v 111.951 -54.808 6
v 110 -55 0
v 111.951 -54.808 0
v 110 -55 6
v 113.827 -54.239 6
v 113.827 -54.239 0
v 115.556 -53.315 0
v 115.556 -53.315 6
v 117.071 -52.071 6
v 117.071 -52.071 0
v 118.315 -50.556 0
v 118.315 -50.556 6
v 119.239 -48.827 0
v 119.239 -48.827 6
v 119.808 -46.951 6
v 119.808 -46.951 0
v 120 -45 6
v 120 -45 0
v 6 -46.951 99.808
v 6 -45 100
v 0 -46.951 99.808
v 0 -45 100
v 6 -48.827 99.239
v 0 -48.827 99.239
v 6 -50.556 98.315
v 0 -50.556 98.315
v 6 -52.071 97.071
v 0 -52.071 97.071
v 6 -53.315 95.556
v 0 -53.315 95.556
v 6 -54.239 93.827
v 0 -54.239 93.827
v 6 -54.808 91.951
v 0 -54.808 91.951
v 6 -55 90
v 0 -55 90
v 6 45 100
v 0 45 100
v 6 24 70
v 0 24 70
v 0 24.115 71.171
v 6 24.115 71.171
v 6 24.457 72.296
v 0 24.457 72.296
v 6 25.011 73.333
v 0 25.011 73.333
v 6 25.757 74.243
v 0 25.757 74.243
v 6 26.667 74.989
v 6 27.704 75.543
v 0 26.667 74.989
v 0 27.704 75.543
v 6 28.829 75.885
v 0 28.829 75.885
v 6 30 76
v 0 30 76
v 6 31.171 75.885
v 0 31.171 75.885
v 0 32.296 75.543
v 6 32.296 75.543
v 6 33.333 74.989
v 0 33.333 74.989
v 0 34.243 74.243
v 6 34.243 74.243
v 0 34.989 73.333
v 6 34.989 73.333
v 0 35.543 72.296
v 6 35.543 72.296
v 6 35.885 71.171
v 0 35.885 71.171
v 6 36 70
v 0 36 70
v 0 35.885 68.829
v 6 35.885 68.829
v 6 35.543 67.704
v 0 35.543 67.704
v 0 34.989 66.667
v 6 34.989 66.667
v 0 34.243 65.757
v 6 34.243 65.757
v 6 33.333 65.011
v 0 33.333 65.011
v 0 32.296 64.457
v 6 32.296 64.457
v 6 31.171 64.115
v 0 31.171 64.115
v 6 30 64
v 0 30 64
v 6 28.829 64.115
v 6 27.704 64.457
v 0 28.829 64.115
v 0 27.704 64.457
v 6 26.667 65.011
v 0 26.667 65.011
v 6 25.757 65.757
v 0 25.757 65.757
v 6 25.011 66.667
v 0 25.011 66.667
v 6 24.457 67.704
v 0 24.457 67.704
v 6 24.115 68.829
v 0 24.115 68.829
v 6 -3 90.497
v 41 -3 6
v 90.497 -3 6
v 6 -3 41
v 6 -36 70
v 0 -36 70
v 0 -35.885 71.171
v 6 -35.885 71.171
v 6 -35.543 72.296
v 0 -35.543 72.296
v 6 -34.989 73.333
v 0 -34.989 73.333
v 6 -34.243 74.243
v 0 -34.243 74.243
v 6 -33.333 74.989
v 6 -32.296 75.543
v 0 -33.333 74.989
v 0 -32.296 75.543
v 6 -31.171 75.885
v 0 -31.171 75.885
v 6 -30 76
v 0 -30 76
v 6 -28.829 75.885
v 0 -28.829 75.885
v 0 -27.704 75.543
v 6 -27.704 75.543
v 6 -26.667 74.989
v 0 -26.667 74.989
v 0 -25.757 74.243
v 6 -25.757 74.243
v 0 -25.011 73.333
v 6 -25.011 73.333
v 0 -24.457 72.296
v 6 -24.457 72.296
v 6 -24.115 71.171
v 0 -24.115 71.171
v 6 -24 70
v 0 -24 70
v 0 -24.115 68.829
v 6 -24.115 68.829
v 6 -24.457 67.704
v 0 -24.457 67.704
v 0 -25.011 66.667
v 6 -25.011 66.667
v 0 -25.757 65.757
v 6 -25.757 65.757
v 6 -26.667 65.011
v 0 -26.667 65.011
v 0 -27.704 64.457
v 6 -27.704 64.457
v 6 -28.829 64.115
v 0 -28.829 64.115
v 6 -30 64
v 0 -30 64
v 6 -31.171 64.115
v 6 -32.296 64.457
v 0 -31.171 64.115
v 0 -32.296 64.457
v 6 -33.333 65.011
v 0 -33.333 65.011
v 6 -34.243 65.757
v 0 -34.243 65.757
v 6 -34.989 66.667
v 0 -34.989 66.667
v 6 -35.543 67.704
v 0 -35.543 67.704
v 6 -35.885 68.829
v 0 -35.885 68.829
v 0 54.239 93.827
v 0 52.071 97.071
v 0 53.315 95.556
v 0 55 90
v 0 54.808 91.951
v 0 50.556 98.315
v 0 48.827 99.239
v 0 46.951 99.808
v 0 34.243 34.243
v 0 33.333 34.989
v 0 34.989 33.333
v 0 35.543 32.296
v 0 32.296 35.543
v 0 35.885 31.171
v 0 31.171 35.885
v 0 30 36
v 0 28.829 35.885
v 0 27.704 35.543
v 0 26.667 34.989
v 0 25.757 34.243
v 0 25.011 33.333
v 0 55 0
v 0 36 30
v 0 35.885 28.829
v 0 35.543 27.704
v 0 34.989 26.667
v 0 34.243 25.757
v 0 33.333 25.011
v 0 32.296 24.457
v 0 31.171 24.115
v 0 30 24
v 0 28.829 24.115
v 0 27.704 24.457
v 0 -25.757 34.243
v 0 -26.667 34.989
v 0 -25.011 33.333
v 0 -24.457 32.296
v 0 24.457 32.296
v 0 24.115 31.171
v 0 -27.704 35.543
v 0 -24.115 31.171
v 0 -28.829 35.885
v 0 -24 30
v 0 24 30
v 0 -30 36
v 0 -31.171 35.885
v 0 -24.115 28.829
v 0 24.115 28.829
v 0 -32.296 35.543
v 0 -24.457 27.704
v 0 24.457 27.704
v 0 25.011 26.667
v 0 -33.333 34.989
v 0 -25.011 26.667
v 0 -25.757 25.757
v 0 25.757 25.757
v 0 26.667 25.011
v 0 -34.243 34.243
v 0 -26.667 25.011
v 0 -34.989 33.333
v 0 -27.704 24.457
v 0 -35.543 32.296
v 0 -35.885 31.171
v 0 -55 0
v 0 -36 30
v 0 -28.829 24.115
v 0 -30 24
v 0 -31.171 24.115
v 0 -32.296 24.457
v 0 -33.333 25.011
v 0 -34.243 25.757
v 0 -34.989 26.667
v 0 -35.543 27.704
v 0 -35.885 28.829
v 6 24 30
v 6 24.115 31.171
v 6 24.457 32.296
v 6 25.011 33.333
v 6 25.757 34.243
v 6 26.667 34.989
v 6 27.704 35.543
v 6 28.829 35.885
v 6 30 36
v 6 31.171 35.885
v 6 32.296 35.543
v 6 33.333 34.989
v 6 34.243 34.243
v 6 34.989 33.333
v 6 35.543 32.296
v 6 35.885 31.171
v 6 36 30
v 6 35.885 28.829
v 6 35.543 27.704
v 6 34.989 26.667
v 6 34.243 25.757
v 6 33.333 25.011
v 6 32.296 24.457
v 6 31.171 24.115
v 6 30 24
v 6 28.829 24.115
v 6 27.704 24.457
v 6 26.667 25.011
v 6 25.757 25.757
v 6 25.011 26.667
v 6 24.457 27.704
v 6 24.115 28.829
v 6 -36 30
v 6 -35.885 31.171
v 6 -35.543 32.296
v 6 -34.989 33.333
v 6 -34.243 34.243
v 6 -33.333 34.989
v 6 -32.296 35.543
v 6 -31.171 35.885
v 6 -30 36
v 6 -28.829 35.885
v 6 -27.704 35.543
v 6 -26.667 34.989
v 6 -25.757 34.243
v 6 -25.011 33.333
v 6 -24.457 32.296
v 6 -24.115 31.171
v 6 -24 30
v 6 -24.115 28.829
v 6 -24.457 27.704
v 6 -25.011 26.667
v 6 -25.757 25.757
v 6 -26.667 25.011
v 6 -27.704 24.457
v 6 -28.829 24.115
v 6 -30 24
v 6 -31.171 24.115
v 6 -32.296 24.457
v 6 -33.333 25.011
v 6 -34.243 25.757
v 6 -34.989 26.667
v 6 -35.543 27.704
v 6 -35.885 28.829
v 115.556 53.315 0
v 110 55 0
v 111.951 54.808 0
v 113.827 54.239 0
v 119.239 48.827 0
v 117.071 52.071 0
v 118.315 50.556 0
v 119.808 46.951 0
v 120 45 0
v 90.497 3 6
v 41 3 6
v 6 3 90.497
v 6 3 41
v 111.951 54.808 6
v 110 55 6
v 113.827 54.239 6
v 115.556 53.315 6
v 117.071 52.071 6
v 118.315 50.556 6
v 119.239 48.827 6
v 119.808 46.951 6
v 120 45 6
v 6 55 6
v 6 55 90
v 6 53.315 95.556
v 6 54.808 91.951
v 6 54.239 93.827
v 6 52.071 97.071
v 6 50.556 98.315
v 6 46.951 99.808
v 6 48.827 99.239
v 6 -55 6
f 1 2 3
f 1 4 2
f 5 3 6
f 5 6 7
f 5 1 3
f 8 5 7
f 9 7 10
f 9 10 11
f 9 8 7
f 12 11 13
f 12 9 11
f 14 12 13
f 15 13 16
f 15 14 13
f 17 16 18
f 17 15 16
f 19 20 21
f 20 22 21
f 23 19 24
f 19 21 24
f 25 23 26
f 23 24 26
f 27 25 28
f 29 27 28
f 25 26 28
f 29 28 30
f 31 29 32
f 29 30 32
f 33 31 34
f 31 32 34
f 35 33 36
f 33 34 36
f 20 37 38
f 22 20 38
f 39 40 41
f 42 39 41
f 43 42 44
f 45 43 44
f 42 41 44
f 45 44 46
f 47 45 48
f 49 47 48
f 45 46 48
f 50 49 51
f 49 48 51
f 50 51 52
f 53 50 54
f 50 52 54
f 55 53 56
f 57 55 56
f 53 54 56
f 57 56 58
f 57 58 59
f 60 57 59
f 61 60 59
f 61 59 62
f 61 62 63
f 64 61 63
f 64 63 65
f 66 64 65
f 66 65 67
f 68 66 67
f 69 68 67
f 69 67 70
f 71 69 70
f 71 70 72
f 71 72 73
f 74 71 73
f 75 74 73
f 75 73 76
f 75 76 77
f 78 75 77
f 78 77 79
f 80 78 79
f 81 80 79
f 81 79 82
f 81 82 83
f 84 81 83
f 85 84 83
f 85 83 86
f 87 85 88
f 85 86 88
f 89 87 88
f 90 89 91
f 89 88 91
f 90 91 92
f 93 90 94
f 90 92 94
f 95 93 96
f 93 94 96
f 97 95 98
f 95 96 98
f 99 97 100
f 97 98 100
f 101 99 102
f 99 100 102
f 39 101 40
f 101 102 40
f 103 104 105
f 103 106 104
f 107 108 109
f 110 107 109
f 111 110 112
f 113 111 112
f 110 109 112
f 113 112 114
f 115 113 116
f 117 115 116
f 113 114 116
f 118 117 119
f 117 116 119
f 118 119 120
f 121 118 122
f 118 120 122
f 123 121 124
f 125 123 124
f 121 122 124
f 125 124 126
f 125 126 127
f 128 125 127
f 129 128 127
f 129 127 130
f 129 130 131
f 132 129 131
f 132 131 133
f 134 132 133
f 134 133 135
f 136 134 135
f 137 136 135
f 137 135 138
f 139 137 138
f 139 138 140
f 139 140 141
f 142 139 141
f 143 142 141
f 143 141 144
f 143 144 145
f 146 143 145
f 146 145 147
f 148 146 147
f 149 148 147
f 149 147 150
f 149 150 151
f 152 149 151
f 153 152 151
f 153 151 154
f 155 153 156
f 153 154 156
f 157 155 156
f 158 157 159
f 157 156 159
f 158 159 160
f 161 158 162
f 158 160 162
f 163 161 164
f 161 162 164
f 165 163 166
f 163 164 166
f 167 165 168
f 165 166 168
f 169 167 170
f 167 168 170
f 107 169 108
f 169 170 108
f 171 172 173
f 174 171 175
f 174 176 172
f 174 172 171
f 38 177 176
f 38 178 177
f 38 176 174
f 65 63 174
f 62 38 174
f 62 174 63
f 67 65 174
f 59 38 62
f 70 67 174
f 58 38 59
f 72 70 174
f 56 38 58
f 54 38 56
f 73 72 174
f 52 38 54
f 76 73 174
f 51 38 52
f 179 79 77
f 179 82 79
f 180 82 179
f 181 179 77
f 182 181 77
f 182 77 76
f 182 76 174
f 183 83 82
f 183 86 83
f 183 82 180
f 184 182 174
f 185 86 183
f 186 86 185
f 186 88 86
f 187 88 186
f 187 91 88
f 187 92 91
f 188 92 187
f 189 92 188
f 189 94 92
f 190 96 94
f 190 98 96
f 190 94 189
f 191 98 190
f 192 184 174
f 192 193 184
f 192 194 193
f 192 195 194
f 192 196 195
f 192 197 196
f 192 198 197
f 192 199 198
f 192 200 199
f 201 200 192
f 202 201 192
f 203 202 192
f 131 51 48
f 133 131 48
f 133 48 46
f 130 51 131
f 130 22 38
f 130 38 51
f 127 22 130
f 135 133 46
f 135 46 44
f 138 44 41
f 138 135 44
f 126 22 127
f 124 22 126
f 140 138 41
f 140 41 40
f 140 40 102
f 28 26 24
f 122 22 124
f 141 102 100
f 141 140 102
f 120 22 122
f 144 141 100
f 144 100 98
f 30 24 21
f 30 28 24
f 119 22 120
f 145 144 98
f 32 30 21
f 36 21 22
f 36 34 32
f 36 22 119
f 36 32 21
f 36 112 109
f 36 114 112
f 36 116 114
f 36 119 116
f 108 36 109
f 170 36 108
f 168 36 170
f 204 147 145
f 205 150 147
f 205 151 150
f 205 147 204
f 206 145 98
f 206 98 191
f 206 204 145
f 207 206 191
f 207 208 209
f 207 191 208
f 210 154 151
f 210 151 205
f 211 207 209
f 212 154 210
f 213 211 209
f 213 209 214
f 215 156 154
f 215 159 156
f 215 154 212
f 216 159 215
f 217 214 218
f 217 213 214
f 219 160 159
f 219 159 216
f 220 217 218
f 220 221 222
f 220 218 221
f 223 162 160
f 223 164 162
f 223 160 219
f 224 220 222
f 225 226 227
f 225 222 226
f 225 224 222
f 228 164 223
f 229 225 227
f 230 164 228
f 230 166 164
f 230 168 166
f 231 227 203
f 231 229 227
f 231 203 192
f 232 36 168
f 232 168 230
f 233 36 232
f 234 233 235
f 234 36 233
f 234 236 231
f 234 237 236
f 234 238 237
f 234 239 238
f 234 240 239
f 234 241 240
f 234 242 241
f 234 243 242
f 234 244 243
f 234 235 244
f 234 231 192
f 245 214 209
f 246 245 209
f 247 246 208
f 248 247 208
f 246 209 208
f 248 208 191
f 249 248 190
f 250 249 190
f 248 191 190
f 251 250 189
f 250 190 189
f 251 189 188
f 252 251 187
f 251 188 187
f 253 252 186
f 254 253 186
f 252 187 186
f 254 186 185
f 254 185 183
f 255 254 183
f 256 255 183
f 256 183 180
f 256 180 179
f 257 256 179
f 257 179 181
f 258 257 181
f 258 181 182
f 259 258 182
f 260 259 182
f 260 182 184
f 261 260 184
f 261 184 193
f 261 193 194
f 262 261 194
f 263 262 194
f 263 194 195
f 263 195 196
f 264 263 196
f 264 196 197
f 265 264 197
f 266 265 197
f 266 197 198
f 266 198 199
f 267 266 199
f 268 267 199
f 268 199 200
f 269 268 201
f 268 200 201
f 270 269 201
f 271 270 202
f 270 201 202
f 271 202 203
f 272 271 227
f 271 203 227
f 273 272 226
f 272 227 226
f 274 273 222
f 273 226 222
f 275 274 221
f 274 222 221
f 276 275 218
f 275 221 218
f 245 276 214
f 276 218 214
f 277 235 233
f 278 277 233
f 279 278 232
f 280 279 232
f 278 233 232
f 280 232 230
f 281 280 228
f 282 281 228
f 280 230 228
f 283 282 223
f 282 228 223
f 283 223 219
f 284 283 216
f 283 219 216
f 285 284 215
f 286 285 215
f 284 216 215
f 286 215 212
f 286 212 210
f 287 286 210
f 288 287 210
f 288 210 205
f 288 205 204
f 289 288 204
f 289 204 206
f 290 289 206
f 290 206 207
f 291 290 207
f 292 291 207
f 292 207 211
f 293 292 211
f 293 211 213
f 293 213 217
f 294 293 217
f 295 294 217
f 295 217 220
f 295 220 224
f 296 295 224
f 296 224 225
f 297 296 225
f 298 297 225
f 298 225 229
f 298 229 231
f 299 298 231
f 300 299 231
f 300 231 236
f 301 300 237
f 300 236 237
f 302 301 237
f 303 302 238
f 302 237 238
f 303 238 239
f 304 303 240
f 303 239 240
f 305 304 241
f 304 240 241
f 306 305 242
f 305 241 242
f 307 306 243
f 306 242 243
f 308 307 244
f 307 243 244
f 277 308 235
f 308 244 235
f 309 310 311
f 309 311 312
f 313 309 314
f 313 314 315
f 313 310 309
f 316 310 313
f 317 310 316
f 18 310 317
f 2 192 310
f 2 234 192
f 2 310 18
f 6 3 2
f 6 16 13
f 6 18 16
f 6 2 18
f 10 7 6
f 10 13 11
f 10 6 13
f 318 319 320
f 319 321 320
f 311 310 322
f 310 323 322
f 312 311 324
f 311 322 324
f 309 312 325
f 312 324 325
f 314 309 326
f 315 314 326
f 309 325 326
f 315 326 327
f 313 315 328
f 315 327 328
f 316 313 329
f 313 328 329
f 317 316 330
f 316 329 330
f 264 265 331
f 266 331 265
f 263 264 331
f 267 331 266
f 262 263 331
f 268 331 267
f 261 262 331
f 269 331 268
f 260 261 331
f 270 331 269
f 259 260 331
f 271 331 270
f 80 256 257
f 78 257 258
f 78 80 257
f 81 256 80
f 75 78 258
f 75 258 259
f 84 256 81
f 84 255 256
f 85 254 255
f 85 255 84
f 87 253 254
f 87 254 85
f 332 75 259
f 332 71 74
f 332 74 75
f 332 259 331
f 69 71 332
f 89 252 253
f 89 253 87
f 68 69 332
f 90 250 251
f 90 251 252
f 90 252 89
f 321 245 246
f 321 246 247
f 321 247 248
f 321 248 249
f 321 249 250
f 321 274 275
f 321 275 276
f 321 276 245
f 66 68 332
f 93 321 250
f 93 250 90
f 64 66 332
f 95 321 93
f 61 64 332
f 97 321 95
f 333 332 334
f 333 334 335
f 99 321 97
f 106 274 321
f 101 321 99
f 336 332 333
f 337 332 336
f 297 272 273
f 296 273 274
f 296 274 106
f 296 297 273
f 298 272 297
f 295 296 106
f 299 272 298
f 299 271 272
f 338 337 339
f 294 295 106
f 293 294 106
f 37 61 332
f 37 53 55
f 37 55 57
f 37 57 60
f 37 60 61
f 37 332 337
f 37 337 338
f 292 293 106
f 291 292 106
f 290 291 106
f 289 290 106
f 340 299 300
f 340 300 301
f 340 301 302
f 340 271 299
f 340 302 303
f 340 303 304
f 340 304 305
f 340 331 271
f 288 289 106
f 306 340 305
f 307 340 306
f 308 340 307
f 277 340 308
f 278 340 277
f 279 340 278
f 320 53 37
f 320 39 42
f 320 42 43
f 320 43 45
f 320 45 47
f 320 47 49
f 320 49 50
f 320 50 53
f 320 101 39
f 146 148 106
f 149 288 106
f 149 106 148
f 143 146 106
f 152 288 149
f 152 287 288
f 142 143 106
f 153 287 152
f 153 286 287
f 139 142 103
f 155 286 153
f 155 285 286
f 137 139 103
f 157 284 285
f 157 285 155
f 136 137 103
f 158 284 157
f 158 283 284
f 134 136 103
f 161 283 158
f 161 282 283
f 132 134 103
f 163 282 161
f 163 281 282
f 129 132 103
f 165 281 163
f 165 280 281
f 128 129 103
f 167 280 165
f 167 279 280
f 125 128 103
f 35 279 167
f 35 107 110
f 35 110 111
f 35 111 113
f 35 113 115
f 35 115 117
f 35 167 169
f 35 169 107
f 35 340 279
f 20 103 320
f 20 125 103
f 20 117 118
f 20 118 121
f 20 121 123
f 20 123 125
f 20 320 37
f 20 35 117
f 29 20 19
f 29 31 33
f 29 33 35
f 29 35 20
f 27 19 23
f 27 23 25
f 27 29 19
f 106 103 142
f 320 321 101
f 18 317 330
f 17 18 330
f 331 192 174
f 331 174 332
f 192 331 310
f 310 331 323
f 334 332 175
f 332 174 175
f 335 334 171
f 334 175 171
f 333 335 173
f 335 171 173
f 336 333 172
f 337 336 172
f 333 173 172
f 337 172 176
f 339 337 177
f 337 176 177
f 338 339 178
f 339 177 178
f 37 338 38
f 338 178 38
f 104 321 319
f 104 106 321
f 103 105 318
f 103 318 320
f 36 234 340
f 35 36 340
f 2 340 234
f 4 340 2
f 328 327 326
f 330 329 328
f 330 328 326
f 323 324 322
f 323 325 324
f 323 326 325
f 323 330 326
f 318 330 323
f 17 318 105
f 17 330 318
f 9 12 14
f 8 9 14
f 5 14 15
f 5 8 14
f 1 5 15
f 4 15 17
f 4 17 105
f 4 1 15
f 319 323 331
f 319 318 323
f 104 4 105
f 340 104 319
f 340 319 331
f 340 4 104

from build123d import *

# Parameters (mm, degrees)
F1_DEPTH = 55
F2_DEPTH = 3
F3_R     = 6
F4_DEPTH = 120.001
F5_R     = 10


with BuildPart() as f1:
    # F0 (on Front) → F1 (new body, symmetric)
    with BuildSketch(Plane.XZ):
        Polygon((0, 100), (0, 0), (120, 0), (120, 6), (90.497475, 6), (41, 6), (6, 6), (6, 41), (6, 90.497475), (6, 100), align=None)
    extrude(amount=F1_DEPTH, both=True)

    # F0 (on Front) → F2 (join, symmetric)
    with BuildSketch(Plane.XZ):
        Polygon((41, 6), (90.497475, 6), (6, 90.497475), (6, 41), align=None)
    extrude(amount=F2_DEPTH, both=True)

    # F3 (on face) → F4 (cut, through all)
    with BuildSketch(Plane(origin=(0, 0, 0), x_dir=(0, -1, 0), z_dir=(-1, 0, 0))):
        with Locations((-30, 70)):
            Circle(F3_R)
        with Locations((30, 70)):
            Circle(F3_R)
        with Locations((30, 30)):
            Circle(F3_R)
        with Locations((-30, 30)):
            Circle(F3_R)
    extrude(amount=-F4_DEPTH, mode=Mode.SUBTRACT)

    # F5
    f5_edges = [f1.edges().sort_by_distance(p)[0] for p in [
        (3, -55, 100),
        (120, -55, 3),
        (120, 55, 3),
        (3, 55, 100),
    ]]
    fillet(f5_edges, radius=F5_R)


solid = f1.part
